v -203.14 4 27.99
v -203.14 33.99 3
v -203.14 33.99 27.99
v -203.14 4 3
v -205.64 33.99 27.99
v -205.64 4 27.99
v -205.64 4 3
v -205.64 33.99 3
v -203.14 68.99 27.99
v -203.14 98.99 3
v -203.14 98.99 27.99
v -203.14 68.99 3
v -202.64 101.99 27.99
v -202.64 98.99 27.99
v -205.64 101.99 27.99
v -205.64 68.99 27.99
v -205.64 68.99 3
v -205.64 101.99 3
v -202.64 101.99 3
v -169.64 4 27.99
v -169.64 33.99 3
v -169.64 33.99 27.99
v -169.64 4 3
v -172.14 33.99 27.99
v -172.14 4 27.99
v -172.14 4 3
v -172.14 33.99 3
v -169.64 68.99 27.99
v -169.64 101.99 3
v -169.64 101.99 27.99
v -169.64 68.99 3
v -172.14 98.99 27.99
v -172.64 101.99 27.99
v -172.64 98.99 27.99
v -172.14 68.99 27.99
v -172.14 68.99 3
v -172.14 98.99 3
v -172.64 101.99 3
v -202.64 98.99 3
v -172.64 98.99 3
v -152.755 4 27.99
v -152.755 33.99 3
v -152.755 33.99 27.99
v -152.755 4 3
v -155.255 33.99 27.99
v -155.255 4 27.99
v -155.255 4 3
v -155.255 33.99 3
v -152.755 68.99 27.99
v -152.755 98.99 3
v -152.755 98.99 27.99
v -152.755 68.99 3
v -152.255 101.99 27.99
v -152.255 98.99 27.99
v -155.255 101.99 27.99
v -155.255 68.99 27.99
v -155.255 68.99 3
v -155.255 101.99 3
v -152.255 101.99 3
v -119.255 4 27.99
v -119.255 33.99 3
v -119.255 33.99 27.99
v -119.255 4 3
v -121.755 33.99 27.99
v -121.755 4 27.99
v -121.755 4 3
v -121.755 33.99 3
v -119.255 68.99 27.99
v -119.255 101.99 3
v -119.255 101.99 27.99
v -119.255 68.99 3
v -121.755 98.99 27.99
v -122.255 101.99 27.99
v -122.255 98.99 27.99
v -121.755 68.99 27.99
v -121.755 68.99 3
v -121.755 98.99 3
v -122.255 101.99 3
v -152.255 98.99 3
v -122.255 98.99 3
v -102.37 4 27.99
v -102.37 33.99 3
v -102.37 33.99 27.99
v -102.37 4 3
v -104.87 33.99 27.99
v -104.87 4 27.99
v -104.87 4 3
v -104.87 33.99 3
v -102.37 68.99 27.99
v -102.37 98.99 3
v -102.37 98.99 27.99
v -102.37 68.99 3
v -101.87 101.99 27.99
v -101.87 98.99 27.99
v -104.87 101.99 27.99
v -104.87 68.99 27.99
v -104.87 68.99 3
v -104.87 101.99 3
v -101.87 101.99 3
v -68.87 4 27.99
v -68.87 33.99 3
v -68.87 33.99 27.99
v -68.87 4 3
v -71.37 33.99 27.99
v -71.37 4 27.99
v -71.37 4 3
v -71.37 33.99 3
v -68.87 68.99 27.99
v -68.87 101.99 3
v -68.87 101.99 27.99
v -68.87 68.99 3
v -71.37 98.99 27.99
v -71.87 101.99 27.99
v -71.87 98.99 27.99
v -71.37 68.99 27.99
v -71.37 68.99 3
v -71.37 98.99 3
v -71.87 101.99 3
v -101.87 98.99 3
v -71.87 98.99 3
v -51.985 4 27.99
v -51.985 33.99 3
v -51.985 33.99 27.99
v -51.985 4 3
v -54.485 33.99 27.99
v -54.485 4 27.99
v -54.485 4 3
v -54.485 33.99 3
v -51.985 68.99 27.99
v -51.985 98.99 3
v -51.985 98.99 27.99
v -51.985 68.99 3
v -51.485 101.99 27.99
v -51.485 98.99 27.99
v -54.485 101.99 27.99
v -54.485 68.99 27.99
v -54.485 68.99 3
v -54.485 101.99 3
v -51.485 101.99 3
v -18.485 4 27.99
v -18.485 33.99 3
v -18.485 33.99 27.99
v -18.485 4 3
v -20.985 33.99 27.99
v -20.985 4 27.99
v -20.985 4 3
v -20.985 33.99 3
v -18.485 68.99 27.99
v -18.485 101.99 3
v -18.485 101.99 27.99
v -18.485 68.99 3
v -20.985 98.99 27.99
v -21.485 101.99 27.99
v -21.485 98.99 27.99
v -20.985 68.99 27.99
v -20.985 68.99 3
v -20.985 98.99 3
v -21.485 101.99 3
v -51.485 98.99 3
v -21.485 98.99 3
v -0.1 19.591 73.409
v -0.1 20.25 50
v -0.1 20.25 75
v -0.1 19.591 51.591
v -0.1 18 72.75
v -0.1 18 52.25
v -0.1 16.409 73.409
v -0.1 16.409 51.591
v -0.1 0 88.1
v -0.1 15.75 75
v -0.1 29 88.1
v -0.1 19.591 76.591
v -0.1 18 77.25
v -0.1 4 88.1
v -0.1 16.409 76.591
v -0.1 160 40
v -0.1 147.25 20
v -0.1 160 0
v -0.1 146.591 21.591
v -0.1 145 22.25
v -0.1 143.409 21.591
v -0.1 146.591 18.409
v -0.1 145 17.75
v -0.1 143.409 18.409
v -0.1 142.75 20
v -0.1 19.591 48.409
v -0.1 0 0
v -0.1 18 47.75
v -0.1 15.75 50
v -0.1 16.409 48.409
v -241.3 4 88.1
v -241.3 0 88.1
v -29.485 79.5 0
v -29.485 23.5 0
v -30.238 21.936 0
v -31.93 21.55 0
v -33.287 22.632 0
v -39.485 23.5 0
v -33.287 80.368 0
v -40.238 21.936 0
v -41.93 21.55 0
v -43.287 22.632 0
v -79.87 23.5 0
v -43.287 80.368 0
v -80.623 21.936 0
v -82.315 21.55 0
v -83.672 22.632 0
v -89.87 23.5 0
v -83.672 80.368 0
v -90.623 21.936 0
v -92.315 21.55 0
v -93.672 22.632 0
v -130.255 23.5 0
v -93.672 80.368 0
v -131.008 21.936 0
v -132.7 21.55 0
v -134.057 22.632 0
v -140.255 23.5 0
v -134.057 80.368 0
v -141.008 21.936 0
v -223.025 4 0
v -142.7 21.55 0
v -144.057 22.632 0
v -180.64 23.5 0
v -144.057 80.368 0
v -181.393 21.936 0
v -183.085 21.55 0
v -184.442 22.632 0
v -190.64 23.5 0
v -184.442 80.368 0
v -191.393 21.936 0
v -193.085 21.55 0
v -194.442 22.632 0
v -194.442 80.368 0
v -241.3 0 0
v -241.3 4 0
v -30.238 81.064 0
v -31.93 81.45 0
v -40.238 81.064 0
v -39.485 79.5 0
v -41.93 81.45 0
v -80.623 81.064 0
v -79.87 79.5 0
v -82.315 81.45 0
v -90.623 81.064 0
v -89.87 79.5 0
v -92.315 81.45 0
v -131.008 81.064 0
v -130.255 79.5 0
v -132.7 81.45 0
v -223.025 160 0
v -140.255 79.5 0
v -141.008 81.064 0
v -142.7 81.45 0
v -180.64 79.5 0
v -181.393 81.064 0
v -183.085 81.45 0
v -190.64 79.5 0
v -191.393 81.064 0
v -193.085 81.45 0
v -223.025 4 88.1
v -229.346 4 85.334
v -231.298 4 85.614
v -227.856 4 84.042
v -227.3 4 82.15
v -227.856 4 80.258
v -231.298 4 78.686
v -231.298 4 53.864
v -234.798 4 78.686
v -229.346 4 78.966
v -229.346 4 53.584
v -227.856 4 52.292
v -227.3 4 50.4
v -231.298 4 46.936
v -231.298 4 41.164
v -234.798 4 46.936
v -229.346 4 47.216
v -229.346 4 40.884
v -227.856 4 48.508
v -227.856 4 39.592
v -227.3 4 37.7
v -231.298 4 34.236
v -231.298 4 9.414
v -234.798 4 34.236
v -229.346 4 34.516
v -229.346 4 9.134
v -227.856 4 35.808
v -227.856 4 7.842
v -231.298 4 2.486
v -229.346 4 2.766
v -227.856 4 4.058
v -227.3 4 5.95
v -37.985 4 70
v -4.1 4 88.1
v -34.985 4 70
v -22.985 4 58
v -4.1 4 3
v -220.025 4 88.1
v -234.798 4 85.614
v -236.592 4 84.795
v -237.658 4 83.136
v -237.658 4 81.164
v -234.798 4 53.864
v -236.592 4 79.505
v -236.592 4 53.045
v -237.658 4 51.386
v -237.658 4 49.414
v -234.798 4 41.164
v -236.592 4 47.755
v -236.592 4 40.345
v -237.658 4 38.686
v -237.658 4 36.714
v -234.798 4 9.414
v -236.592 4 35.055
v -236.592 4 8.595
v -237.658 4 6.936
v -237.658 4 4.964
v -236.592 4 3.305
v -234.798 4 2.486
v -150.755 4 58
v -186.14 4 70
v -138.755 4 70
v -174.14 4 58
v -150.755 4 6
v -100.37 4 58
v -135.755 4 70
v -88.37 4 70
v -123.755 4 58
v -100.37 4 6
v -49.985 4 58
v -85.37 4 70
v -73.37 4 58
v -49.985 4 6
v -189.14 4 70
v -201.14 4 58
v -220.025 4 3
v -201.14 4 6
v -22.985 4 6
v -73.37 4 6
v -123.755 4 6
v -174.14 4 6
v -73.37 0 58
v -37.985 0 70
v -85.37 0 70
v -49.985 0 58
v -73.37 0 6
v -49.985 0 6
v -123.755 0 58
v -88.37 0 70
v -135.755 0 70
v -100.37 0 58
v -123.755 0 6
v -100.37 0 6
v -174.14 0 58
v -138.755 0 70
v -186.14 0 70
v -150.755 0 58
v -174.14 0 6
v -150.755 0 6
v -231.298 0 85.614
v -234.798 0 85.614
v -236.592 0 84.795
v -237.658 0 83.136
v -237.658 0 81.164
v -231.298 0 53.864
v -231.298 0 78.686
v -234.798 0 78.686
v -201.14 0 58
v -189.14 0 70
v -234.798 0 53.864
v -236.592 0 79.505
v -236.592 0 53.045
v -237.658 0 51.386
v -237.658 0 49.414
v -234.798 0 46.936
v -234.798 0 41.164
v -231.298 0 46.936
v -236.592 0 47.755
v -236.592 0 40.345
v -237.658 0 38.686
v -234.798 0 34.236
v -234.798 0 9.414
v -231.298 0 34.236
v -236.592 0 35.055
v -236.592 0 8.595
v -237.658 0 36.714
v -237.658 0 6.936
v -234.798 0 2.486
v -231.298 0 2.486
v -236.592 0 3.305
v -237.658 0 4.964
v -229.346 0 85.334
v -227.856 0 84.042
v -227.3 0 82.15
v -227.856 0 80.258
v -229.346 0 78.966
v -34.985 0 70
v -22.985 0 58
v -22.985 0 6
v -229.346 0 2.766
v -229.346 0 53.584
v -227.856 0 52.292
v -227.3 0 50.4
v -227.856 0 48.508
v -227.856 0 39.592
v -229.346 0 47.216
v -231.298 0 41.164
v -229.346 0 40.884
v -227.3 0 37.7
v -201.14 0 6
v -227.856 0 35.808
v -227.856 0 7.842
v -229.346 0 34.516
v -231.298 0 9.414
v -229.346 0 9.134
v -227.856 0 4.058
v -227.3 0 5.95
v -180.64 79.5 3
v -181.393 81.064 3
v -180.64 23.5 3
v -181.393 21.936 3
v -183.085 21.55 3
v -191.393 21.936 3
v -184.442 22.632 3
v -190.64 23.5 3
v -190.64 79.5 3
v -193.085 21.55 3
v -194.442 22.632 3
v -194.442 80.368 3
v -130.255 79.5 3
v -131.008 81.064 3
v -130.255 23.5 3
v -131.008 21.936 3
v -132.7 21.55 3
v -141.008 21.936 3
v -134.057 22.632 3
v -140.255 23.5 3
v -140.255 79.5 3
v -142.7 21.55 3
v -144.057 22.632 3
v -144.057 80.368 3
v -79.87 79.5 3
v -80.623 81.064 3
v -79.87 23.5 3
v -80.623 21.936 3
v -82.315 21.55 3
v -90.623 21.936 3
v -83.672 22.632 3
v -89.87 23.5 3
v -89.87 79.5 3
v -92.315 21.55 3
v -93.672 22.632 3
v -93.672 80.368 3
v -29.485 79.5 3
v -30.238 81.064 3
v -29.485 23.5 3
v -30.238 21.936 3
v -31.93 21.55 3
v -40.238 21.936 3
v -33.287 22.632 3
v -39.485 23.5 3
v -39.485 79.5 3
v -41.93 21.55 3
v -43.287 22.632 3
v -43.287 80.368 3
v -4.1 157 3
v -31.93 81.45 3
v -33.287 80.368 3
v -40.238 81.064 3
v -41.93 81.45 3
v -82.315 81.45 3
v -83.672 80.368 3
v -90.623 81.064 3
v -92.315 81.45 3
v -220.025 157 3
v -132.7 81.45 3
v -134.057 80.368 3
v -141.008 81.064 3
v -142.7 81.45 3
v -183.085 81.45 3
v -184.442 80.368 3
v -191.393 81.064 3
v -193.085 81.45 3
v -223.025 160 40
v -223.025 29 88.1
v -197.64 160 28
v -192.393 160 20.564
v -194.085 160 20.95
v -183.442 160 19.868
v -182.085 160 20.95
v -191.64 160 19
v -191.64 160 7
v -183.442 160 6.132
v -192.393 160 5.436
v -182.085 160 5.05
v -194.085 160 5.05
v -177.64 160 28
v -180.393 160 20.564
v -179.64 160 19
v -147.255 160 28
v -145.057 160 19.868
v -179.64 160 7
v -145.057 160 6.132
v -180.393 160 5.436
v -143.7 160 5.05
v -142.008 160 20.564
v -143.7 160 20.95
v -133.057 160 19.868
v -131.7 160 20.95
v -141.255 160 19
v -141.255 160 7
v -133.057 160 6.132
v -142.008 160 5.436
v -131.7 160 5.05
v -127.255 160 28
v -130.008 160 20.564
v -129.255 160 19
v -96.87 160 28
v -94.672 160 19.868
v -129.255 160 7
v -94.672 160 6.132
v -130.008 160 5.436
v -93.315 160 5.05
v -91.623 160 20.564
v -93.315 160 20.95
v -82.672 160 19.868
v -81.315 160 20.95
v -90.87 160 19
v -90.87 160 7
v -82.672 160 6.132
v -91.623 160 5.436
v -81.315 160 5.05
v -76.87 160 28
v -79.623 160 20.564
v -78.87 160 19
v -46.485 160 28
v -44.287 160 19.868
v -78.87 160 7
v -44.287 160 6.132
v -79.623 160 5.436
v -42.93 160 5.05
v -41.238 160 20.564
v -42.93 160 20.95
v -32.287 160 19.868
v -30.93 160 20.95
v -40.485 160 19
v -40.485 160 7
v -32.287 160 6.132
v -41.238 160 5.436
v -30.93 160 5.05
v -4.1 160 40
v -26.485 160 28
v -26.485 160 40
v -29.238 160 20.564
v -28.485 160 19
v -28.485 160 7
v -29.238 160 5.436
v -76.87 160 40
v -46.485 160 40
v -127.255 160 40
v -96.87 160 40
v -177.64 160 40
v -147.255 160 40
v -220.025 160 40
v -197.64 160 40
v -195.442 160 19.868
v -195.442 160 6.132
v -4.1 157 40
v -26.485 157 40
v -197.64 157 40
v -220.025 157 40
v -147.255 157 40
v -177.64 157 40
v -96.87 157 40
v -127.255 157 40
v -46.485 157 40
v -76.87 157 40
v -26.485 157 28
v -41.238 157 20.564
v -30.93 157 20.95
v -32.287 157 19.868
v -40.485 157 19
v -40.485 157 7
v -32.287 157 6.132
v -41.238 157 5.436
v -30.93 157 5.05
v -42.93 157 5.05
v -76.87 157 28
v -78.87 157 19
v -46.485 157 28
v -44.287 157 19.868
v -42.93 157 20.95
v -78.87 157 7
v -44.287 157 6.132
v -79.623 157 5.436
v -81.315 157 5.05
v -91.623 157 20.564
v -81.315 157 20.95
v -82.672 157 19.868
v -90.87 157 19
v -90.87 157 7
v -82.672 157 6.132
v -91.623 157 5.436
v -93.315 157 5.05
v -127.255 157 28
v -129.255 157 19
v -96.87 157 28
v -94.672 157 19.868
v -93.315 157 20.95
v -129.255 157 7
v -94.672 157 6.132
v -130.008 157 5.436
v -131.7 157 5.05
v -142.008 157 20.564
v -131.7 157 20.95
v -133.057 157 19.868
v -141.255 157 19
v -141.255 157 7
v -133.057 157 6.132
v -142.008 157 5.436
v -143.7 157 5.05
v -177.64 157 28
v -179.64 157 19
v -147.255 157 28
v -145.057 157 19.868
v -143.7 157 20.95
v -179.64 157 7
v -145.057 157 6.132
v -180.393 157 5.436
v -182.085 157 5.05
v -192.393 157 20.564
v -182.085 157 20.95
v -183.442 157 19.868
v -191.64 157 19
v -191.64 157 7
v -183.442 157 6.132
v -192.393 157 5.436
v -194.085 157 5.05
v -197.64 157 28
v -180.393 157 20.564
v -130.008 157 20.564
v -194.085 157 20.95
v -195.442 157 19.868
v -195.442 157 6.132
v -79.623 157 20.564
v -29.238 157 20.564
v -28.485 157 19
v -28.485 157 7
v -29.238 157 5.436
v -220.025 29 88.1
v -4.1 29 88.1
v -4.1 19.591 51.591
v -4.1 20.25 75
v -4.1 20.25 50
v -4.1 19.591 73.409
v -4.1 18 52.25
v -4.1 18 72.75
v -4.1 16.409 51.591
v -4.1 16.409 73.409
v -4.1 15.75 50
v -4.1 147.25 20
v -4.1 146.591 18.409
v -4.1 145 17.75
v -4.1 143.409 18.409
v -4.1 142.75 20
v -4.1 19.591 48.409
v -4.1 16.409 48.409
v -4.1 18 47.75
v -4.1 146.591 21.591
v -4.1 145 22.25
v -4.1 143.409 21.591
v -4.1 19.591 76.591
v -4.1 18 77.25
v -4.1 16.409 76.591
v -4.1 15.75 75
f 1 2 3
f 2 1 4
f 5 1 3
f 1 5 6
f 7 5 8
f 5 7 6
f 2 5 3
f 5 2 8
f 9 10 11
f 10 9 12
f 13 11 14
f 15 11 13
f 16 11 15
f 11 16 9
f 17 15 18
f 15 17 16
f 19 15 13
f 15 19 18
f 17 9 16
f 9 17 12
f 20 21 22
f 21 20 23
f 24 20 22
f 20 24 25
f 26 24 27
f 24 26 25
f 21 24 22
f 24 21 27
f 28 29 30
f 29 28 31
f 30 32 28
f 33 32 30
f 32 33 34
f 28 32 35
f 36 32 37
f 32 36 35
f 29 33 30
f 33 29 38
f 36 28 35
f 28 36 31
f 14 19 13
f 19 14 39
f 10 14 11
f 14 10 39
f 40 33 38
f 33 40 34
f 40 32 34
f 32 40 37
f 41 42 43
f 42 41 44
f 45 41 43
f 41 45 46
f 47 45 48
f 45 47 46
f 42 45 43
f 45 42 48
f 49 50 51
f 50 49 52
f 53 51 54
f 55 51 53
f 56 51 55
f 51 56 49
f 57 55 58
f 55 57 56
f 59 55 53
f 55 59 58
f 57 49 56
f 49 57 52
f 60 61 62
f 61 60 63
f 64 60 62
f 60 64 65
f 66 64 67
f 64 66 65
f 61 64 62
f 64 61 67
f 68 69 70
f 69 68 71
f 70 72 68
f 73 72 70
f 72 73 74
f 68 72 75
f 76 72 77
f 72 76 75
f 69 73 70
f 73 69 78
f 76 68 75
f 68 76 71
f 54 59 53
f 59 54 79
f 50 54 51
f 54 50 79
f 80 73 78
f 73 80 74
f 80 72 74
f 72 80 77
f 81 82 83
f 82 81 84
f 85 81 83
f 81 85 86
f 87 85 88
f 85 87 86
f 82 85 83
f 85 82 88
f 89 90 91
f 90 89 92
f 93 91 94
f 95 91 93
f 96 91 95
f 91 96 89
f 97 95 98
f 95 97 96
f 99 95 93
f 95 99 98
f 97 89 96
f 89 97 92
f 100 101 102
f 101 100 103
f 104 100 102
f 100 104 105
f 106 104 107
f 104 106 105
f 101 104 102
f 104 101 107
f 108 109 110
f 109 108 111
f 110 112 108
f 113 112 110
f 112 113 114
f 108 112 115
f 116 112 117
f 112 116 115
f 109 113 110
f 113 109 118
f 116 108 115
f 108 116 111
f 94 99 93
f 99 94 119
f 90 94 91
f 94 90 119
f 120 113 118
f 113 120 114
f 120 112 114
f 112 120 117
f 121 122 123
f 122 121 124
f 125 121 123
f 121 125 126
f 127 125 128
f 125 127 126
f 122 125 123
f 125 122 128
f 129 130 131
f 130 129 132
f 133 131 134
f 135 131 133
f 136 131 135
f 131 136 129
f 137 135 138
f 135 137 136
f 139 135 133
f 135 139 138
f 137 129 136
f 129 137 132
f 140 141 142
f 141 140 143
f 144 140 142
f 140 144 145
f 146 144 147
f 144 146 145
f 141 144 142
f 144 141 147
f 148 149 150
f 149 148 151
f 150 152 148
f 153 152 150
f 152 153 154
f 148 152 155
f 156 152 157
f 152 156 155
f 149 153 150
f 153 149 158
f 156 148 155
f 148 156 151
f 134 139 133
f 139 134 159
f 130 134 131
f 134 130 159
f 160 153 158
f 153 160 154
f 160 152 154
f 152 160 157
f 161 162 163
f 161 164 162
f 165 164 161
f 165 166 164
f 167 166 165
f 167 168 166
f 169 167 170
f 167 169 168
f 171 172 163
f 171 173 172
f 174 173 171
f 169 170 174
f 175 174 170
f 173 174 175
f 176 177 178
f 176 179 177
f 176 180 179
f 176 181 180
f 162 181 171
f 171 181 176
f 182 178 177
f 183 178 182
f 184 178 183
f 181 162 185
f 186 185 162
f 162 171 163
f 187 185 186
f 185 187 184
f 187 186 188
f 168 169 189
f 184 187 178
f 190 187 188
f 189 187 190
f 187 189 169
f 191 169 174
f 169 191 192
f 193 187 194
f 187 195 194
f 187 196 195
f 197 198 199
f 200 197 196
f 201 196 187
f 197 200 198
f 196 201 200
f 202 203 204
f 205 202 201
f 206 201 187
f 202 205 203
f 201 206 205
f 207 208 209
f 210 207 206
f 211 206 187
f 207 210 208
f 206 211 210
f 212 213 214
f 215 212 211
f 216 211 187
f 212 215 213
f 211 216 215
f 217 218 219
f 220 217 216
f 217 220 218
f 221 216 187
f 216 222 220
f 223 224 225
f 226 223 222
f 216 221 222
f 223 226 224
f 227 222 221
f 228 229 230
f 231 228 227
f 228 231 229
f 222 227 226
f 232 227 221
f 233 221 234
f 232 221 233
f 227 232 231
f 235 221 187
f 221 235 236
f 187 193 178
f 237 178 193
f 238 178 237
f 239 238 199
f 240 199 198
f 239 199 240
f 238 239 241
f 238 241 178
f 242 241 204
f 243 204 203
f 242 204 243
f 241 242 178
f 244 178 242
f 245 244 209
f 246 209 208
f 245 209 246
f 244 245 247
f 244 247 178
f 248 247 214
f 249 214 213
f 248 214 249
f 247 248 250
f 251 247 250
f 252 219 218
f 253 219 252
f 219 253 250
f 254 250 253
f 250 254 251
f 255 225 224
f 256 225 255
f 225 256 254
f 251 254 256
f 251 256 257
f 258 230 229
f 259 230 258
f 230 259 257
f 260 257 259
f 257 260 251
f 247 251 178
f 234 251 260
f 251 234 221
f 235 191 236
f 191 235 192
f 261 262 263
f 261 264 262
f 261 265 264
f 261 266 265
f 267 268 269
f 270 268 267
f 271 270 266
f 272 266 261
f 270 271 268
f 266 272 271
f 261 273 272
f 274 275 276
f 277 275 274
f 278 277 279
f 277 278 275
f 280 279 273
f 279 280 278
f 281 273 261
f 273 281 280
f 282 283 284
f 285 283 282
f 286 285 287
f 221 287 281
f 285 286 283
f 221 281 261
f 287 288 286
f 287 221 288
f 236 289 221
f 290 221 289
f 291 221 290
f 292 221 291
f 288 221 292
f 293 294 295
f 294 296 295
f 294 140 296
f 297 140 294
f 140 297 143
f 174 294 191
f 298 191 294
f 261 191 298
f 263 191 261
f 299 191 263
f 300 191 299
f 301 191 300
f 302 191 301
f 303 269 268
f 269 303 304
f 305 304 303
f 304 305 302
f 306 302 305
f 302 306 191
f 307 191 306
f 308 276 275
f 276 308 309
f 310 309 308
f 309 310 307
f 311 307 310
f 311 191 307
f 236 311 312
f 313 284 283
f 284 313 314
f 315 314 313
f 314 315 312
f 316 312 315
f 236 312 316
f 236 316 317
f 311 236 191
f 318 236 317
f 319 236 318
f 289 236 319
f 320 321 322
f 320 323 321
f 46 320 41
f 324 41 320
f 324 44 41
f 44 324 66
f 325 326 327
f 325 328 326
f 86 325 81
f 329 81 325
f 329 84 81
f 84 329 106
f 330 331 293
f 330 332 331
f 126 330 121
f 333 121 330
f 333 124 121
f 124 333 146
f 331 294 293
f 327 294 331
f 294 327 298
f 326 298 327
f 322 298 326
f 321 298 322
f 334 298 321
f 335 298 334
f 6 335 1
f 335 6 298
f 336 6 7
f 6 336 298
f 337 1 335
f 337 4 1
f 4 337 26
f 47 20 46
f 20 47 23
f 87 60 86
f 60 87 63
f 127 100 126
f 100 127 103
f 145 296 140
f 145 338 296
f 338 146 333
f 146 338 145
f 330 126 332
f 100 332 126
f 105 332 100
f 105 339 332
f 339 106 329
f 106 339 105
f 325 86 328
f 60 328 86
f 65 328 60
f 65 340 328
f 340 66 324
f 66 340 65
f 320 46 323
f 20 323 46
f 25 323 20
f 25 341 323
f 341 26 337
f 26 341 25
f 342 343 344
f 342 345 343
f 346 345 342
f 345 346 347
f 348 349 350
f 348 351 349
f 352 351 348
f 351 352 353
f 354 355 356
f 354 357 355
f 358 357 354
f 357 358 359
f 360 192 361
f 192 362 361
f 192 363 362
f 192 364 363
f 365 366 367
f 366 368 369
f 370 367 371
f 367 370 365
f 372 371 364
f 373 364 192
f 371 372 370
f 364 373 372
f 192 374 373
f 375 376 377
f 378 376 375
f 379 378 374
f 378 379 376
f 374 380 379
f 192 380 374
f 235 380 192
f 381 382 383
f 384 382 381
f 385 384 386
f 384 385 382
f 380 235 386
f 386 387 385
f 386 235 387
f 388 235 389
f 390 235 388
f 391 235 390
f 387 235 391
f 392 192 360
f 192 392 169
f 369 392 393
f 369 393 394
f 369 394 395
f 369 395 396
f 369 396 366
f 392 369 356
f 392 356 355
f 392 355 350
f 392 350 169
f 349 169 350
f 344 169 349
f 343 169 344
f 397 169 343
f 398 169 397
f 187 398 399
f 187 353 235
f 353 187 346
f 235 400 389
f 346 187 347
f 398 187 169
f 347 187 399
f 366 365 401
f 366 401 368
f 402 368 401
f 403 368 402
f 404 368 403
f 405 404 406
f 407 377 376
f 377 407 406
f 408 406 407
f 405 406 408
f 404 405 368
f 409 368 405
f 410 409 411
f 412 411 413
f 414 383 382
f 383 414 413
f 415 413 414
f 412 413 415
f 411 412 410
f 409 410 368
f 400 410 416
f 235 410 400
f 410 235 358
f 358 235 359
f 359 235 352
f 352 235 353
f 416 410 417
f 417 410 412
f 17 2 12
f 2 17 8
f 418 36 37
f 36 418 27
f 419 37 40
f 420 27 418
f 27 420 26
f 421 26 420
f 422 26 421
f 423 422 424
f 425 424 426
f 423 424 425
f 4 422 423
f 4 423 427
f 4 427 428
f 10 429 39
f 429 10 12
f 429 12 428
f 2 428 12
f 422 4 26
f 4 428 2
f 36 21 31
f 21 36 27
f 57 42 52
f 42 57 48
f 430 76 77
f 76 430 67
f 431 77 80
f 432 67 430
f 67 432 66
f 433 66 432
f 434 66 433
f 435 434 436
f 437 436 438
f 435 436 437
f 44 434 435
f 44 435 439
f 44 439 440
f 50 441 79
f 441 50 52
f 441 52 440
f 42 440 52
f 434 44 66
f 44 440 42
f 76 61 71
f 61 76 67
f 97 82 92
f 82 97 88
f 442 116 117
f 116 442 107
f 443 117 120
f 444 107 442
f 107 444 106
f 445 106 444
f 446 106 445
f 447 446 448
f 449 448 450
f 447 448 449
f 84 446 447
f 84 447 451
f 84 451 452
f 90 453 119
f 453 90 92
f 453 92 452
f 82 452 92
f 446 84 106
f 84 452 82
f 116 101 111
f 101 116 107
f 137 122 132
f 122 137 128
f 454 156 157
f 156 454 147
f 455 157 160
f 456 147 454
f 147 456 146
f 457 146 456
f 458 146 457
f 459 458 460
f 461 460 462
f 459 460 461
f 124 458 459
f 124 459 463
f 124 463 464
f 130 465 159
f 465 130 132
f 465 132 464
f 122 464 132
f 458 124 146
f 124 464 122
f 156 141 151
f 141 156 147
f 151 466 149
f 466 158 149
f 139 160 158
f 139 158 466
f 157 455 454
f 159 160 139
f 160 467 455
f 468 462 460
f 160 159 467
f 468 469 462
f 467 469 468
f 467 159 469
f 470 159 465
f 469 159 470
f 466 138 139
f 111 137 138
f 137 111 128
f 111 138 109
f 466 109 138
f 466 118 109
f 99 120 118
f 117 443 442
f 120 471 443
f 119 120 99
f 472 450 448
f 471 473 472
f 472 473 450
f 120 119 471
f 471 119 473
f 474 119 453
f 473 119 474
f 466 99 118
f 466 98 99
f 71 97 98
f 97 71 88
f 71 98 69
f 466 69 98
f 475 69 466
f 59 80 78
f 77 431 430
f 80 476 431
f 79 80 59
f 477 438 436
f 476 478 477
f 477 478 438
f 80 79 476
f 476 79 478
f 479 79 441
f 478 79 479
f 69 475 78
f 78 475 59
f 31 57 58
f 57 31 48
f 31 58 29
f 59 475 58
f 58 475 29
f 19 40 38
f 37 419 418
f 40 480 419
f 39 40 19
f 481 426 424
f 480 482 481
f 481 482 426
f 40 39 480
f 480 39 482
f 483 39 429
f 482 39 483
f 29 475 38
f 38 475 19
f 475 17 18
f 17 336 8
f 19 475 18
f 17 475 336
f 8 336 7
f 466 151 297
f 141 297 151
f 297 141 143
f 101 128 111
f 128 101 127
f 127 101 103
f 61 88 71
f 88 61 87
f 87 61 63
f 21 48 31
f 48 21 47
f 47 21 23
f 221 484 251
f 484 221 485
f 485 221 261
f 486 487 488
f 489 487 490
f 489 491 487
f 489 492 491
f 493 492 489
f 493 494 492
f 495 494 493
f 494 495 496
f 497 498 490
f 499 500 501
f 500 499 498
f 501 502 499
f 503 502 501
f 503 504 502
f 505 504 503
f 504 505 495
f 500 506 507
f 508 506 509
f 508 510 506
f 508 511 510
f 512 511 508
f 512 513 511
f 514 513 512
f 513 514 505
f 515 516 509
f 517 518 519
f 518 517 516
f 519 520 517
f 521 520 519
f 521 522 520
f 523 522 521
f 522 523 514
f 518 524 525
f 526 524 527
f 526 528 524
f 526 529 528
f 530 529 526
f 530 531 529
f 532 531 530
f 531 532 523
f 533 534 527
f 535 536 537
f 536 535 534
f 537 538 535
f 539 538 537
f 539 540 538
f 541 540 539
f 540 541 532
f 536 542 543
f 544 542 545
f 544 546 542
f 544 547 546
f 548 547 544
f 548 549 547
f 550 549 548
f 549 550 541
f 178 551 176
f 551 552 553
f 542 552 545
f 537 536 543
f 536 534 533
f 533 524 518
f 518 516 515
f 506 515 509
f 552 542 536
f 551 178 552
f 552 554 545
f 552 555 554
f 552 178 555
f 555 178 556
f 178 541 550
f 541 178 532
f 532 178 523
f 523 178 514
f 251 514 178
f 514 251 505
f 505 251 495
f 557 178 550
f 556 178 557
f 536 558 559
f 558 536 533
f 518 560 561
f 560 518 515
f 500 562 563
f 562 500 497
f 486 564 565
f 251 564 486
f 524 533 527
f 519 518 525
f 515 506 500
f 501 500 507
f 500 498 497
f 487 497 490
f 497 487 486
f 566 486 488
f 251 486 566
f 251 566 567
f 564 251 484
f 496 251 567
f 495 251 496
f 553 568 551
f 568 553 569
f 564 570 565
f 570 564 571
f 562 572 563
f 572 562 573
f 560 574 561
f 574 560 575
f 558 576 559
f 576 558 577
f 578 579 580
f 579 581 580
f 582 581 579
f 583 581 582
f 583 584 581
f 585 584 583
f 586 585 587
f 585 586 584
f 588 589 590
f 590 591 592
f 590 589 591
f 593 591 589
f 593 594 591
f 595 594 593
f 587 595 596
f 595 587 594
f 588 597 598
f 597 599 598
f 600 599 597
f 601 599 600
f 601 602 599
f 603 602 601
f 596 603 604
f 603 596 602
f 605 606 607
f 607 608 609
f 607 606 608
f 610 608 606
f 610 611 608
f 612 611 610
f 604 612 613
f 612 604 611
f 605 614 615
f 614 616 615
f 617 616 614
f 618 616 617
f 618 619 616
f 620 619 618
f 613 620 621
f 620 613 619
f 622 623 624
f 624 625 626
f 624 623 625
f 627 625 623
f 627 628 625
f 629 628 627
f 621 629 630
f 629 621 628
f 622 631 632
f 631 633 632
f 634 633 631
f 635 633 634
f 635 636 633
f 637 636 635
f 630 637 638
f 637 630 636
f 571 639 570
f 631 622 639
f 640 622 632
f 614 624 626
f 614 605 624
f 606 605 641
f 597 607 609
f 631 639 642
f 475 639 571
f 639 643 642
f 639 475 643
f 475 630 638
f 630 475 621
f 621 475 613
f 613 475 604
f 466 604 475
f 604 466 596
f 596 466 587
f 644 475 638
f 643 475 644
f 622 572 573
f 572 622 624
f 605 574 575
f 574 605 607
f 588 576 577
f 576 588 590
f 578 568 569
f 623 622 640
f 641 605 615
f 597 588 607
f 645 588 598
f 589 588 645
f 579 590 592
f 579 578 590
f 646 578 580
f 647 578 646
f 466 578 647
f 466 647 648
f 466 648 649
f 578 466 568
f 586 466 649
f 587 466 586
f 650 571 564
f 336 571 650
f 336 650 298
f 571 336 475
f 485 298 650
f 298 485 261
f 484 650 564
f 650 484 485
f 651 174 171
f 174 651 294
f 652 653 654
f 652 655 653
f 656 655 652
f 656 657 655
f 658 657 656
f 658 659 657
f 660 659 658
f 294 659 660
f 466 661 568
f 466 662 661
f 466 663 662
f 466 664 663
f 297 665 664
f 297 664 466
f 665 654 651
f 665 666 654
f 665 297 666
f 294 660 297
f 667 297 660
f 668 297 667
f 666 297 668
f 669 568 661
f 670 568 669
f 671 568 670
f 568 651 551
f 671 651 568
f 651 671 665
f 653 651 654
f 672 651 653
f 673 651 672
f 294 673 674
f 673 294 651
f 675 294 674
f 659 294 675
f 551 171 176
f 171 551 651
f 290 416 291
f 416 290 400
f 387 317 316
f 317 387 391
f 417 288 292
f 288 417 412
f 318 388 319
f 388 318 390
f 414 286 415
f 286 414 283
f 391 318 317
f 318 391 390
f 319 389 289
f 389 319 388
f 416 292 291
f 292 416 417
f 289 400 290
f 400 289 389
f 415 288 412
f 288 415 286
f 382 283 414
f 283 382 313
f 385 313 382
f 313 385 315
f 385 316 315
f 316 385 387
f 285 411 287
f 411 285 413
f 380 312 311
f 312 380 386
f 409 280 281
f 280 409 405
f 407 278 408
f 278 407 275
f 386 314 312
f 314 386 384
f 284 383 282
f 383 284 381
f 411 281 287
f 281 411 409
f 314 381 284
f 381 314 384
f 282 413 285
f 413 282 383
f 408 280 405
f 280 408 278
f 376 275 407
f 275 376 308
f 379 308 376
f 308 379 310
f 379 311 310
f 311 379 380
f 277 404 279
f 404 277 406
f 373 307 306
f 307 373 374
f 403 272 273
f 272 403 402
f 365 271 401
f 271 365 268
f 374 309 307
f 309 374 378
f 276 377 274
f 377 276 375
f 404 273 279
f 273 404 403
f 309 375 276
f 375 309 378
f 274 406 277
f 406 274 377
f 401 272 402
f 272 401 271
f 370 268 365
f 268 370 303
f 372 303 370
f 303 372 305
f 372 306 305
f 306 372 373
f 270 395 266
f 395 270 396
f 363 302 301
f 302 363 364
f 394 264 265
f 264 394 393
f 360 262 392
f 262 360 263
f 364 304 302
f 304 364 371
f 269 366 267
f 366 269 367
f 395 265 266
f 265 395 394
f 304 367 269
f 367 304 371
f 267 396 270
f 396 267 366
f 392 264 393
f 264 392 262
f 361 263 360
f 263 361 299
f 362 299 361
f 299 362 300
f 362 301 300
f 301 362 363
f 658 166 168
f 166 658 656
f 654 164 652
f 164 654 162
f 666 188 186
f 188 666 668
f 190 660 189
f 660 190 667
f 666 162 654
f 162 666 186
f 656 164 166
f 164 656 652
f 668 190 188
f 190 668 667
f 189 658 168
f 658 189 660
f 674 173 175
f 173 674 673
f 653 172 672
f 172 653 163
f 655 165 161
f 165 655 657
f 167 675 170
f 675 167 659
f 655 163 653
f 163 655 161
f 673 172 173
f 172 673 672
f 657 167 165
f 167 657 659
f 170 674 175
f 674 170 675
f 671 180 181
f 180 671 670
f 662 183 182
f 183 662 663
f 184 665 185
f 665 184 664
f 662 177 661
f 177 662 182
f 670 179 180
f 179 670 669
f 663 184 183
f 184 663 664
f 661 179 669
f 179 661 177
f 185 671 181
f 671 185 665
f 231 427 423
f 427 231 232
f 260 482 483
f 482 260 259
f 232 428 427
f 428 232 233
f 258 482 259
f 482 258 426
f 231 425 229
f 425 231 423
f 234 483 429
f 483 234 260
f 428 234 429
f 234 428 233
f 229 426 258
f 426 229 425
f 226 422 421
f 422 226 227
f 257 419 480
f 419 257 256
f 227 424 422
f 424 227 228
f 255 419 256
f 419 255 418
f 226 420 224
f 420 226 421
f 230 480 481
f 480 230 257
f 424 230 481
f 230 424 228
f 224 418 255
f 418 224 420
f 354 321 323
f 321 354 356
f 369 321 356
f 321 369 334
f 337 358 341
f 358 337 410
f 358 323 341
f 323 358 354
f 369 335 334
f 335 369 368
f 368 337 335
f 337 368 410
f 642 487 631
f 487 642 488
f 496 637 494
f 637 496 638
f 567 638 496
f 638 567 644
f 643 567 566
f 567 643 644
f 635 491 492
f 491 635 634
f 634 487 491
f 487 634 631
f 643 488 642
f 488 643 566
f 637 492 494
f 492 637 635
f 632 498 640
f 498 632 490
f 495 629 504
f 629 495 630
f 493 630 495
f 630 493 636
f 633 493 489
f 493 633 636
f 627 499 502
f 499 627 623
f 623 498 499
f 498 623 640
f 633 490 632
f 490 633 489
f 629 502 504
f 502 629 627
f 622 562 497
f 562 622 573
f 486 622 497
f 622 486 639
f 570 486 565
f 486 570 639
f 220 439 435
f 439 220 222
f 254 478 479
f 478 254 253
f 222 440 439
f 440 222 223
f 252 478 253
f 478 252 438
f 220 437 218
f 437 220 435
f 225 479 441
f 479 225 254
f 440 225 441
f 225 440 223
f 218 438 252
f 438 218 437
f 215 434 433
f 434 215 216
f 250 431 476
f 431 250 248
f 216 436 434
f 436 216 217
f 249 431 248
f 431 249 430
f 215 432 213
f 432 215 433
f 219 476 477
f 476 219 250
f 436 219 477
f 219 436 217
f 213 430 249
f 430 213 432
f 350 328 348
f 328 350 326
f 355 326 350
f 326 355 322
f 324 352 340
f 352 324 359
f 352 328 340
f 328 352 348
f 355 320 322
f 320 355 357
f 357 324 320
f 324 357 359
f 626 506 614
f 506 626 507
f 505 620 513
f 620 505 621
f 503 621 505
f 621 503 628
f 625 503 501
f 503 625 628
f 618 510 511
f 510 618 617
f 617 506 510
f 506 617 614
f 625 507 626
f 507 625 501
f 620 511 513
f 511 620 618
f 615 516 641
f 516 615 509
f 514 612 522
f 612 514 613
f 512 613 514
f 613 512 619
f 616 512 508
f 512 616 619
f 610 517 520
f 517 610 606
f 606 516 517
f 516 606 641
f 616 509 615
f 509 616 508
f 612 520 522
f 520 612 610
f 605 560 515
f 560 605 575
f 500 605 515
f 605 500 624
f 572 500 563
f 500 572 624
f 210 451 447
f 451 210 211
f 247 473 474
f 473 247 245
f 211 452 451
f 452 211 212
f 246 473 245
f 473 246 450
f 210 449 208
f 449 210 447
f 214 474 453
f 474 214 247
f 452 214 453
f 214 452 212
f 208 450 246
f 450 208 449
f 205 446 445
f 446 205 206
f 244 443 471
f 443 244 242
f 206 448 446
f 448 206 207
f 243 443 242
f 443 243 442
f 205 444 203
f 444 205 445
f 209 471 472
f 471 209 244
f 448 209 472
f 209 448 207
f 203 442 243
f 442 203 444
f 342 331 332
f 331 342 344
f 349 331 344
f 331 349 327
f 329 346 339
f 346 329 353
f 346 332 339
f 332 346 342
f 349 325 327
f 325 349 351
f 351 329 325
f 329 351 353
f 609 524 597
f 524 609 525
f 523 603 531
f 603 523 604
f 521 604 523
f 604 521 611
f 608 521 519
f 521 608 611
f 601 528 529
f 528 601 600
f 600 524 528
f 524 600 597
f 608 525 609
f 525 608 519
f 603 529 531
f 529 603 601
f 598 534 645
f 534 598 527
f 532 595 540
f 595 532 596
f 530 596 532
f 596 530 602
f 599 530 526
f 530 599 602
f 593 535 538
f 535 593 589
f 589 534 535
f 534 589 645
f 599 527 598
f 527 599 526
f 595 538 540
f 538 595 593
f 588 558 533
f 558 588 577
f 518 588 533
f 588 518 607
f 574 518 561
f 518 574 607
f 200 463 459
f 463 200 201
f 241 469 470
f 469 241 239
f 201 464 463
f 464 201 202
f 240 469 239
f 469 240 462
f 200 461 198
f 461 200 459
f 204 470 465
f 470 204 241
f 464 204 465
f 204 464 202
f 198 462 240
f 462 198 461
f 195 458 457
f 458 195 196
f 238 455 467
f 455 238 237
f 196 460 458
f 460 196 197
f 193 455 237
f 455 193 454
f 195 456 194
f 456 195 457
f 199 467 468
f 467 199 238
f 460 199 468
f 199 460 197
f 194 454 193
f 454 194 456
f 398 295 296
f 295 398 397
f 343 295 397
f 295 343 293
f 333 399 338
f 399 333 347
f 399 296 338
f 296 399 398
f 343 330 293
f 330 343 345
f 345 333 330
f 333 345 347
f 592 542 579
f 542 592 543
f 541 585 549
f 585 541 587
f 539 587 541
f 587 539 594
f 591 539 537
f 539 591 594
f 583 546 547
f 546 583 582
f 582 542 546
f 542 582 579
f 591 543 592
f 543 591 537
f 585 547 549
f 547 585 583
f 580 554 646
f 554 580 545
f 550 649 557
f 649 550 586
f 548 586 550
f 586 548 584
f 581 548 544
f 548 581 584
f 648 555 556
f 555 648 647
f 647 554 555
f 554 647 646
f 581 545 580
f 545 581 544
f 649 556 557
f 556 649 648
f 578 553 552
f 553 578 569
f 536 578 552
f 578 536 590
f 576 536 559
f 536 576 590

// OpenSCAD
// Raspberry Pi rack shelf - 2U left half, four Pis standing on their long edge
// Render this file to generate pi_rack_shelf_2u_pi.stl

include <_pi_rack_shelf.scad>

shelf_2u_pi();
